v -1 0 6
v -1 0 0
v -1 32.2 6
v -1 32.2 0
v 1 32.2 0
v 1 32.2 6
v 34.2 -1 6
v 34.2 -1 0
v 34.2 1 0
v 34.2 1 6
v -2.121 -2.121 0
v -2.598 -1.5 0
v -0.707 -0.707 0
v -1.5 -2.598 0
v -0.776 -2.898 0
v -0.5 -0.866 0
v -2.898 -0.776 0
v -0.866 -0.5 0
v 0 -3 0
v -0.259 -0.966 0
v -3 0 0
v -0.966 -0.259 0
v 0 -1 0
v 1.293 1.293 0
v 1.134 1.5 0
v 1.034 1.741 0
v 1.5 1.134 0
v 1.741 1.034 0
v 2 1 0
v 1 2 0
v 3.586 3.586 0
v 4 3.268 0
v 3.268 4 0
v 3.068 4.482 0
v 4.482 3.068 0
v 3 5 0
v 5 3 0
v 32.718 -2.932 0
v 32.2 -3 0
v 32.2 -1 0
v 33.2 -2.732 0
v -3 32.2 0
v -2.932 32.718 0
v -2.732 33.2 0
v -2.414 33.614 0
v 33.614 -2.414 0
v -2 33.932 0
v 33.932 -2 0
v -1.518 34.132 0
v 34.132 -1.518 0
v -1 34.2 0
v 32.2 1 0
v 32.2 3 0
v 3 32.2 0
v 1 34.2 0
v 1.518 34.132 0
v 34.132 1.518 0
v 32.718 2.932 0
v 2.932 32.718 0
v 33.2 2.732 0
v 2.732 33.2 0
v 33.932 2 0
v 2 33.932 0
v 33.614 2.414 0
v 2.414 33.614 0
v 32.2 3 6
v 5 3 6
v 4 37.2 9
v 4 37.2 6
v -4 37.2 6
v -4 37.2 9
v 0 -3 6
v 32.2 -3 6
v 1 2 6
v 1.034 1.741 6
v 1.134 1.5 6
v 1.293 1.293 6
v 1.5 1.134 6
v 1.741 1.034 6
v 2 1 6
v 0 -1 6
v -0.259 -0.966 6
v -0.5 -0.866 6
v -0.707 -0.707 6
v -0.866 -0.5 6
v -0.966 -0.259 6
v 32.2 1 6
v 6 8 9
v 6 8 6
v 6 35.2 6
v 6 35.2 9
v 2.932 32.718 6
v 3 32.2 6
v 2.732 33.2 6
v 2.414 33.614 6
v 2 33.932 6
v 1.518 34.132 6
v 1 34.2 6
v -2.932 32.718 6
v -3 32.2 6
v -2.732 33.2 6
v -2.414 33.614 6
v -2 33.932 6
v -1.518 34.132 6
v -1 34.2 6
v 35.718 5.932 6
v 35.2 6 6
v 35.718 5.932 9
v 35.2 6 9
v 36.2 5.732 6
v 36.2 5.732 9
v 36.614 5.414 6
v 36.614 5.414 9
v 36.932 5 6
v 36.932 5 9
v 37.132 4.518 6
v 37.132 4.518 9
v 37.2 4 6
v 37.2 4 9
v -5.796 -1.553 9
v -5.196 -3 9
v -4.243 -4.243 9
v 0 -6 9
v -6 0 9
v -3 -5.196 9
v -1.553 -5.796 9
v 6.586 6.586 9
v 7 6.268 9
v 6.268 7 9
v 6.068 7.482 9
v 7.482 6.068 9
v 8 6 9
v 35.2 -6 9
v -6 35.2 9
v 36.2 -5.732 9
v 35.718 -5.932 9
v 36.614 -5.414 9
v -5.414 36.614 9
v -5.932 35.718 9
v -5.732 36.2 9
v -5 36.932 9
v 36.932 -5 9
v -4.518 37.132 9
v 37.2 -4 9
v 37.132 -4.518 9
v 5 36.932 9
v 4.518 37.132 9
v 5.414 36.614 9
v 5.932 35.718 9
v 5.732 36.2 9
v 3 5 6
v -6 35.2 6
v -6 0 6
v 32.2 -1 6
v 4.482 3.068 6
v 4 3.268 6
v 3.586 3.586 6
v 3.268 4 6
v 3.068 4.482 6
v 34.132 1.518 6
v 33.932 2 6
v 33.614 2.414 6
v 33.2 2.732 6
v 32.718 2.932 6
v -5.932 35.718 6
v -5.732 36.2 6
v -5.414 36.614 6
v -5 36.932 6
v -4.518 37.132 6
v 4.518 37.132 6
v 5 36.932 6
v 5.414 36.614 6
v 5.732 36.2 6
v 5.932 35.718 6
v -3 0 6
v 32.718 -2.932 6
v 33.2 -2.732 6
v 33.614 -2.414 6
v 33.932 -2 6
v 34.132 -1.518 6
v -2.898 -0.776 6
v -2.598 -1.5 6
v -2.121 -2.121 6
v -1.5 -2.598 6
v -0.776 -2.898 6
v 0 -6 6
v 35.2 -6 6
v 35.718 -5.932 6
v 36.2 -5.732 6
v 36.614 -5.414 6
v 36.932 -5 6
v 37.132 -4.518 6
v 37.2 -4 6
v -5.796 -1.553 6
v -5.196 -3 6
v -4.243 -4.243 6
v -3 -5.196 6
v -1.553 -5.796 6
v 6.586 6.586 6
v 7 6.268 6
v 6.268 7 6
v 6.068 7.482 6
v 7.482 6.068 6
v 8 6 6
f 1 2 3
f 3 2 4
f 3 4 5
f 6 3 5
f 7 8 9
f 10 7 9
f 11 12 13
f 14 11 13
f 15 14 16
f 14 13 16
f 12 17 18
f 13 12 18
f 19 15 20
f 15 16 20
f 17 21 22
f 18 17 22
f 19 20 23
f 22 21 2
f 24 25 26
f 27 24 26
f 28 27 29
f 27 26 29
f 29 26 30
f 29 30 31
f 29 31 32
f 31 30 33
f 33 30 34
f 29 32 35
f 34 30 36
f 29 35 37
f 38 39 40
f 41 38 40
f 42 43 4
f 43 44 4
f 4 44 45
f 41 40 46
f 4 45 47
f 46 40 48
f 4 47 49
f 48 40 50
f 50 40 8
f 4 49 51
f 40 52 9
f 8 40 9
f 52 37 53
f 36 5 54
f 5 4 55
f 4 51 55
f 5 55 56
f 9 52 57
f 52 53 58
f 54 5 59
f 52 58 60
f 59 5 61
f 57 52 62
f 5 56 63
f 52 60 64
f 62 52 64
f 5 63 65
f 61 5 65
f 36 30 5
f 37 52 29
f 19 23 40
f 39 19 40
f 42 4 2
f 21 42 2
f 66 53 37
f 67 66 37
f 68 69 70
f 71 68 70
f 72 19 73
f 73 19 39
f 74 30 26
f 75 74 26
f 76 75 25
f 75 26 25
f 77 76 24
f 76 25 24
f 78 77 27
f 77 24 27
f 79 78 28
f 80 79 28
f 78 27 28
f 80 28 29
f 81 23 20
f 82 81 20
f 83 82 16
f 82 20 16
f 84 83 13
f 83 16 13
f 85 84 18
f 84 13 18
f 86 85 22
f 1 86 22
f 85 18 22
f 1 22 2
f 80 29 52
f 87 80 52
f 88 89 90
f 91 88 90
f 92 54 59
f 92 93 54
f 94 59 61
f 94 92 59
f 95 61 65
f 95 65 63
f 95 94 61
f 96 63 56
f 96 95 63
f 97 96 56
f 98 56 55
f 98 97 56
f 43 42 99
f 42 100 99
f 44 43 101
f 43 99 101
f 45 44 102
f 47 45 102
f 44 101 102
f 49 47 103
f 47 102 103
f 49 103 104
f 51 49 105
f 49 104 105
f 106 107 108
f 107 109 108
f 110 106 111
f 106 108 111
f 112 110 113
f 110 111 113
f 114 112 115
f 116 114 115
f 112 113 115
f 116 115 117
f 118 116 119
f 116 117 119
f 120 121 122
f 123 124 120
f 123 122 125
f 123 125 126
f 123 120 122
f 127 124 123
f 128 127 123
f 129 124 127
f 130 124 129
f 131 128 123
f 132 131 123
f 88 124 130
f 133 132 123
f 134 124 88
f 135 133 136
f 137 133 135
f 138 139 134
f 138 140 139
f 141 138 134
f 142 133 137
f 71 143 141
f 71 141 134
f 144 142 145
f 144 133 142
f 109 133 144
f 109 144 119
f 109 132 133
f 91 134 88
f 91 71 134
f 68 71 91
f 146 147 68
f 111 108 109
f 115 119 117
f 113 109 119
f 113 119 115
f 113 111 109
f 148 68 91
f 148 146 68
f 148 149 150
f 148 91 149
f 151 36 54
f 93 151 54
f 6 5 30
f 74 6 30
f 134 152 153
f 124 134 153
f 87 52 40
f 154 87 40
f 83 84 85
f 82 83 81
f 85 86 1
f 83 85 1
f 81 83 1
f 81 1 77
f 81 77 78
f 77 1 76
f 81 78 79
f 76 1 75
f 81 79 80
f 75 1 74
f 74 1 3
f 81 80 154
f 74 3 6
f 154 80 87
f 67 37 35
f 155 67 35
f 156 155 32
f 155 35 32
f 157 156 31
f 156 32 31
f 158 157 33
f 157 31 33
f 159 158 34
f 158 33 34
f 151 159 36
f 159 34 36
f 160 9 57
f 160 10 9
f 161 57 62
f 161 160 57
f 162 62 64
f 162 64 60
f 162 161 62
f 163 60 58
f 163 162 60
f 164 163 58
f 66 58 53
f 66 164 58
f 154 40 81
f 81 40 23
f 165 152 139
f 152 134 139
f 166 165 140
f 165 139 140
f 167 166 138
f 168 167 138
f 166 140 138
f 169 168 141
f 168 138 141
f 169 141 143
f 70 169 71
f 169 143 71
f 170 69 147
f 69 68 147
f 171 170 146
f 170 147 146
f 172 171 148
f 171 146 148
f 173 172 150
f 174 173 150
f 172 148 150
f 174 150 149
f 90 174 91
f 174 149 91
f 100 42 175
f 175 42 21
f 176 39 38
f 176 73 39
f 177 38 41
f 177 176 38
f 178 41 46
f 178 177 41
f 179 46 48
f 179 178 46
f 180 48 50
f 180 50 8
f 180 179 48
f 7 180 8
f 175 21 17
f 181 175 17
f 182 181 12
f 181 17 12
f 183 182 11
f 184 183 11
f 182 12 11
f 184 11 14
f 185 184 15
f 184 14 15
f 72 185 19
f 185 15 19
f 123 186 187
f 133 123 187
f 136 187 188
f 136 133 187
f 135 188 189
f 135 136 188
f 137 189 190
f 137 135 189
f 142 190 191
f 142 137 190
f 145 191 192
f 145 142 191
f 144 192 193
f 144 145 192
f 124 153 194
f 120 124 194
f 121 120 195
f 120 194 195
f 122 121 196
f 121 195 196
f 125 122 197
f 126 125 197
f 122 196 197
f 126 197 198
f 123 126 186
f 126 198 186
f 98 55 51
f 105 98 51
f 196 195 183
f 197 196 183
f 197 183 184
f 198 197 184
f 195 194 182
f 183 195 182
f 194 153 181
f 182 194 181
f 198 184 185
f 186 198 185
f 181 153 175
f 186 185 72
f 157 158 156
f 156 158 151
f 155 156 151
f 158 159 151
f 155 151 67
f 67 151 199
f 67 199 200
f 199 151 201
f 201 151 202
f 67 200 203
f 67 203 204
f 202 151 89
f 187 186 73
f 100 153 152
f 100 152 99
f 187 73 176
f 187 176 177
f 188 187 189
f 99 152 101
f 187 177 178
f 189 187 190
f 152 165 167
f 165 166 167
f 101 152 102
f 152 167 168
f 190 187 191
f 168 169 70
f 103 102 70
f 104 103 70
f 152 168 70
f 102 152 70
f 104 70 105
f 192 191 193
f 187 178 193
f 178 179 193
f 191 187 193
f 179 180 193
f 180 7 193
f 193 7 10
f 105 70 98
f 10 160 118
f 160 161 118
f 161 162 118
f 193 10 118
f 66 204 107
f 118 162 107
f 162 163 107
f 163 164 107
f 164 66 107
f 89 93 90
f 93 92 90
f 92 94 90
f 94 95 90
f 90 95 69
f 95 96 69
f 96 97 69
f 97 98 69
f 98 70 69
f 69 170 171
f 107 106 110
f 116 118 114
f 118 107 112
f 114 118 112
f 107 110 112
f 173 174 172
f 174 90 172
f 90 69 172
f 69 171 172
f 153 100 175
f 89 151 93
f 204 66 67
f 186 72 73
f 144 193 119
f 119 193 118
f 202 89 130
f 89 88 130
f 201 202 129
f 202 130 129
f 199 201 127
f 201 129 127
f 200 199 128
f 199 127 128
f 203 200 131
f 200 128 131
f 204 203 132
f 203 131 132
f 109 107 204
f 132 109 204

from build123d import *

# Parameters (mm, degrees)
F1_DEPTH = 6
F3_DEPTH = 3
F4_R     = 2
F5_R     = 2


with BuildPart() as f1:
    # F0 (on Top) → F1 (new body)
    with BuildSketch(Plane.XY):
        with BuildLine():
            Line((-3, 34.2), (-3, 0))
            ThreePointArc((-3, 0), (-2.1213203436, -2.1213203436), (0, -3))
            Line((0, -3), (34.2, -3))
            Line((34.2, -3), (34.2, 3))
            Line((34.2, 3), (5, 3))
            ThreePointArc((5, 3), (3.5857864376, 3.5857864376), (3, 5))
            Line((3, 5), (3, 34.2))
            Line((3, 34.2), (-3, 34.2))
        make_face()
        with BuildLine():
            Line((1, 32.2), (1, 2))
            ThreePointArc((1, 2), (1.2928932188, 1.2928932188), (2, 1))
            Line((2, 1), (32.2, 1))
            Line((32.2, 1), (32.2, -1))
            Line((32.2, -1), (0, -1))
            ThreePointArc((0, -1), (-0.7071067812, -0.7071067812), (-1, 0))
            Line((-1, 0), (-1, 32.2))
            Line((-1, 32.2), (1, 32.2))
        make_face(mode=Mode.SUBTRACT)
    extrude(amount=F1_DEPTH)

    # F2 (on face) → F3 (join)
    with BuildSketch(Plane.XY.offset(6)):
        with BuildLine():
            Line((-6, 37.2), (-6, 0))
            ThreePointArc((-6, 0), (-4.2426406871, -4.2426406871), (0, -6))
            Line((0, -6), (37.2, -6))
            Line((37.2, -6), (37.2, 6))
            Line((37.2, 6), (6, 6))
            Line((6, 6), (6, 37.2))
            Line((6, 37.2), (-6, 37.2))
        make_face()
        with BuildLine():
            Line((-3, 0), (-3, 34.2))
            Line((-3, 34.2), (3, 34.2))
            Line((3, 34.2), (3, 5))
            ThreePointArc((3, 5), (3.5857864376, 3.5857864376), (5, 3))
            Line((5, 3), (34.2, 3))
            Line((34.2, 3), (34.2, -3))
            Line((34.2, -3), (0, -3))
            ThreePointArc((0, -3), (-2.1213203436, -2.1213203436), (-3, 0))
        make_face(mode=Mode.SUBTRACT)
        with BuildLine():
            Line((3, 34.2), (-3, 34.2))
            Line((-3, 34.2), (-3, 0))
            ThreePointArc((-3, 0), (-2.1213203436, -2.1213203436), (0, -3))
            Line((0, -3), (34.2, -3))
            Line((34.2, -3), (34.2, 3))
            Line((34.2, 3), (5, 3))
            ThreePointArc((5, 3), (3.5857864376, 3.5857864376), (3, 5))
            Line((3, 5), (3, 34.2))
        make_face()
        with BuildLine():
            ThreePointArc((0, -1), (-0.7071067812, -0.7071067812), (-1, 0))
            Line((-1, 0), (-1, 32.2))
            Line((-1, 32.2), (1, 32.2))
            Line((1, 32.2), (1, 2))
            ThreePointArc((1, 2), (1.2928932188, 1.2928932188), (2, 1))
            Line((2, 1), (32.2, 1))
            Line((32.2, 1), (32.2, -1))
            Line((32.2, -1), (0, -1))
        make_face(mode=Mode.SUBTRACT)
        with BuildLine():
            Line((-1, 32.2), (-1, 0))
            ThreePointArc((-1, 0), (-0.7071067812, -0.7071067812), (0, -1))
            Line((0, -1), (32.2, -1))
            Line((32.2, -1), (32.2, 1))
            Line((32.2, 1), (2, 1))
            ThreePointArc((2, 1), (1.2928932188, 1.2928932188), (1, 2))
            Line((1, 2), (1, 32.2))
            Line((1, 32.2), (-1, 32.2))
        make_face()
    extrude(amount=F3_DEPTH)

    # F4
    f4_edges = [f1.edges().sort_by_distance(p)[0] for p in [
        (6, 37.2, 7.5),
        (6, 6, 7.5),
        (37.2, 6, 7.5),
        (37.2, -6, 7.5),
        (-6, 37.2, 7.5),
    ]]
    fillet(f4_edges, radius=F4_R)

    # F5
    f5_edges = [f1.edges().sort_by_distance(p)[0] for p in [
        (-3, 34.2, 3),
        (3, 34.2, 3),
        (34.2, 3, 3),
        (34.2, -3, 3),
    ]]
    fillet(f5_edges, radius=F5_R)


solid = f1.part
